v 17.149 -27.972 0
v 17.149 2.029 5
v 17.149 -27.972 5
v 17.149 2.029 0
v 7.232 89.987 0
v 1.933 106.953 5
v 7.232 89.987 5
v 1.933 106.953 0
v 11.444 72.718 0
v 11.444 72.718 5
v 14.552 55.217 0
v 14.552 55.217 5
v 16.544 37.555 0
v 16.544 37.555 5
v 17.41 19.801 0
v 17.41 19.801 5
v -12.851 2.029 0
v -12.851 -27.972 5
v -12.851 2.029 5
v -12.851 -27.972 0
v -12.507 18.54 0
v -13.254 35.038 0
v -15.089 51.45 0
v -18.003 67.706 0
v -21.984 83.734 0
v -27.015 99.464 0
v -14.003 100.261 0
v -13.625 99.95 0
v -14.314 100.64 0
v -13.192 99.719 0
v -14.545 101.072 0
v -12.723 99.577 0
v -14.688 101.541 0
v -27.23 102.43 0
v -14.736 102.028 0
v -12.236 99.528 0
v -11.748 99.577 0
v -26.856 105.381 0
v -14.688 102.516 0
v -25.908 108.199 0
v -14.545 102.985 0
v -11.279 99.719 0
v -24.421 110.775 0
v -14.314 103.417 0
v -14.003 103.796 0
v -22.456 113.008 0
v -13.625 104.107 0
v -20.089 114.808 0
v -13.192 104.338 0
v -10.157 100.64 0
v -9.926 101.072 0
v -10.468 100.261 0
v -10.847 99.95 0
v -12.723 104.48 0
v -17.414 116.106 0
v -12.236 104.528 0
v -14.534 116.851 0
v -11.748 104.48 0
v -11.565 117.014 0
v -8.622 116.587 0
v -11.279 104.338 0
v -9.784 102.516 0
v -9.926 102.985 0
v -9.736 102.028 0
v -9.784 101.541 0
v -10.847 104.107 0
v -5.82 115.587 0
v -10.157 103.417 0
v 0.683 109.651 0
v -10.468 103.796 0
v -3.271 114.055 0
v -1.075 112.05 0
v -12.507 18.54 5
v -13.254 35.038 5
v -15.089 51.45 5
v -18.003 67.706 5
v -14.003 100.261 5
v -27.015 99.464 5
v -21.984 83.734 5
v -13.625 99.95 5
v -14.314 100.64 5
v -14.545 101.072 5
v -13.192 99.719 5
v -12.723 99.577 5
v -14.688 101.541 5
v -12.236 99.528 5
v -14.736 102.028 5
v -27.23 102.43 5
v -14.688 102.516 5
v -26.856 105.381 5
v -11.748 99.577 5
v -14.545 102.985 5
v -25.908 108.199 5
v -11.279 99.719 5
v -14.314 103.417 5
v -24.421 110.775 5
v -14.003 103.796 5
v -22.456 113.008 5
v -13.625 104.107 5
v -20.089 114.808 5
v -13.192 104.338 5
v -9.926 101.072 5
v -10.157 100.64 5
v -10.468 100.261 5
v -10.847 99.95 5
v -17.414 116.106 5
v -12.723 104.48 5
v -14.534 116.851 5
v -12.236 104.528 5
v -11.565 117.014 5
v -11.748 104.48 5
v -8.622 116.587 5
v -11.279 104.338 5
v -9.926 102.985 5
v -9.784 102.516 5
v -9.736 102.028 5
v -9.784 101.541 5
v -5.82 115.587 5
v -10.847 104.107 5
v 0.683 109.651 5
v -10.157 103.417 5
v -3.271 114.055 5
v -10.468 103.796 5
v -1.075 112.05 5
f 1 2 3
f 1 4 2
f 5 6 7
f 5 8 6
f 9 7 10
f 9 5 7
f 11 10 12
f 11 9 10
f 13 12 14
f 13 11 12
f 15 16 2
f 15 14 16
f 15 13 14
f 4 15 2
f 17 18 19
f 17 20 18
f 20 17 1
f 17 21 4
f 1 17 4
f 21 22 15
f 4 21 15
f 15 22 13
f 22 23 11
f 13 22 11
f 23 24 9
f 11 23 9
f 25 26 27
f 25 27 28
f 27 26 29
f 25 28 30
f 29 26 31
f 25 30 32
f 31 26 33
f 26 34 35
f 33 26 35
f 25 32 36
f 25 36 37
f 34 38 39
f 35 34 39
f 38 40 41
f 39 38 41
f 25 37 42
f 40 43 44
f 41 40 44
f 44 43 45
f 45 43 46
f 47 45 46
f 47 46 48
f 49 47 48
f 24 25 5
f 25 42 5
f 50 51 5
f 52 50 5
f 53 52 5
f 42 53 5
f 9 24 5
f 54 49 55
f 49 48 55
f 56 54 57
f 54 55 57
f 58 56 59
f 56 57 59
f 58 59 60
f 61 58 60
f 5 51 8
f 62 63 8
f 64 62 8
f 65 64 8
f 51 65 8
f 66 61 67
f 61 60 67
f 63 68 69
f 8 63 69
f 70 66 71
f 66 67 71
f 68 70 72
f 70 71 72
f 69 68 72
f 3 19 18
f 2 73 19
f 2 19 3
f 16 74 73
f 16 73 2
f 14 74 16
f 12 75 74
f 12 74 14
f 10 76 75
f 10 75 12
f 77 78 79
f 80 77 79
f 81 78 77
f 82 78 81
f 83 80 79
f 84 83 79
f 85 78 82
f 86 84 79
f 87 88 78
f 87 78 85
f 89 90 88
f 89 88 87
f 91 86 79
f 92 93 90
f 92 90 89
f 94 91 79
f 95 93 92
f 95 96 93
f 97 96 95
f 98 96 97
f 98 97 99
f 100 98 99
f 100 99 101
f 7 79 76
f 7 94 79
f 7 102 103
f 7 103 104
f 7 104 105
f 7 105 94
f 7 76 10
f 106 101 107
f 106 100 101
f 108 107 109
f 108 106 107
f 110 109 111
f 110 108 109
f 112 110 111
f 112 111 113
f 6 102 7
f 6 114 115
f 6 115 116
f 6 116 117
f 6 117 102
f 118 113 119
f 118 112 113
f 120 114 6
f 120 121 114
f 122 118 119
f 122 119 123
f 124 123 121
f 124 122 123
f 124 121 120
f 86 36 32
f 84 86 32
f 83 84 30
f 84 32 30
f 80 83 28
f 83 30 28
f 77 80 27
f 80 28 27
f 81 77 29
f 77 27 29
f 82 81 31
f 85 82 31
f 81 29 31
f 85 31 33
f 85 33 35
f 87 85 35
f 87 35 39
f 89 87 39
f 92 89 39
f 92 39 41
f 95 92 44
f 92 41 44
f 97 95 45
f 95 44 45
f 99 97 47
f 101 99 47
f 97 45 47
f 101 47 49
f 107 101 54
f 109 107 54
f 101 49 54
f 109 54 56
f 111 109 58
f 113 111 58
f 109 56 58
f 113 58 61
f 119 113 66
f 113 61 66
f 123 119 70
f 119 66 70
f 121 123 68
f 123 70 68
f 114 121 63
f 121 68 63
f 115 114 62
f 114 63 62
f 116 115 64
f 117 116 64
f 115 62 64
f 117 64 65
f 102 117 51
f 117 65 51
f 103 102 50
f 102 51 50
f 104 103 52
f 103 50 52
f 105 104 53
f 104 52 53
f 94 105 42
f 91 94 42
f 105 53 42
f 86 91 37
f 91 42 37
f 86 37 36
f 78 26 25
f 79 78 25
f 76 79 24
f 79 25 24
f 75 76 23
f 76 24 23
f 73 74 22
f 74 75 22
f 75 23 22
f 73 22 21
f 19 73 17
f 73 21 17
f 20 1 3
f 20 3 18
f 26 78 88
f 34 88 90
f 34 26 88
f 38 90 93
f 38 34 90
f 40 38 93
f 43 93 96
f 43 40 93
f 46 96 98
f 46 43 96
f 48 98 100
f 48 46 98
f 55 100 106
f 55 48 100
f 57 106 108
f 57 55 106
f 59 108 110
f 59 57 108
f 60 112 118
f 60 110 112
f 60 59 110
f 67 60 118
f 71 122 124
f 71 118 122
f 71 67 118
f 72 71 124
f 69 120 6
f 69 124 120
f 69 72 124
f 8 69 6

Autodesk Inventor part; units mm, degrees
ref_plane "YZ Plane" through (0, 0, 0) normal (1, 0, 0) x (0, 1, 0)
ref_plane "XZ Plane" through (0, 0, 0) normal (0, 1, 0) x (-1, 0, 0)
ref_plane "XY Plane" through (0, 0, 0) normal (0, 0, 1) x (1, 0, 0)
sketch "Skizze1" plane through (0, 0, 0) normal (0, 0, 1) x (1, 0, 0)
  line L0 (-319.4908, 0) -> (79.1023, 0) projected
  line L1 (0, -57.6247) -> (0, 149.9482) projected
  line L2 (17.1489, -27.9715) -> (-12.8511, -27.9715)
  line L3 (-12.8511, -27.9715) -> (-12.8511, 2.0285)
  line L4 (-12.8511, 2.0285) -> (17.1489, 2.0285)
  line L5 (17.1489, 2.0285) -> (17.1489, -27.9715)
  arc A0 (1.933, 106.9528) -> (-27.0148, 99.4639) centre (-12.2357, 102.0285) ccw
  arc A1 (-12.8511, 2.0285) -> (-27.0148, 99.4639) centre (-262.4886, 15.487) ccw
  arc A2 (17.1489, 2.0285) -> (1.933, 106.9528) centre (-262.5489, 15.0327) ccw
  point P0 (0, 0)
  dimension "d0" = 30
  dimension "d1" = 30
  dimension "d2" = 30
  dimension "d4" = 100
  dimension "d6" = 250
  dimension "d7" = 280
extrude "Extrusion1" add sketch "Skizze1" along normal blind 5
sketch "Skizze2" plane through (0, 0, 5) normal (0, 0, 1) x (1, 0, 0)
  arc A0 (1.933, 106.9528) -> (-27.0148, 99.4639) centre (-12.2357, 102.0285) ccw projected
  point P0 (0, 0)
  dimension "d10" = 0
  dimension "d11" = 0
hole "Bohrung1" at (-12.2357, 102.0285, 5) direction (0, 0, -1) diameter 5 end through all
properties part number "Stütze vorne"
